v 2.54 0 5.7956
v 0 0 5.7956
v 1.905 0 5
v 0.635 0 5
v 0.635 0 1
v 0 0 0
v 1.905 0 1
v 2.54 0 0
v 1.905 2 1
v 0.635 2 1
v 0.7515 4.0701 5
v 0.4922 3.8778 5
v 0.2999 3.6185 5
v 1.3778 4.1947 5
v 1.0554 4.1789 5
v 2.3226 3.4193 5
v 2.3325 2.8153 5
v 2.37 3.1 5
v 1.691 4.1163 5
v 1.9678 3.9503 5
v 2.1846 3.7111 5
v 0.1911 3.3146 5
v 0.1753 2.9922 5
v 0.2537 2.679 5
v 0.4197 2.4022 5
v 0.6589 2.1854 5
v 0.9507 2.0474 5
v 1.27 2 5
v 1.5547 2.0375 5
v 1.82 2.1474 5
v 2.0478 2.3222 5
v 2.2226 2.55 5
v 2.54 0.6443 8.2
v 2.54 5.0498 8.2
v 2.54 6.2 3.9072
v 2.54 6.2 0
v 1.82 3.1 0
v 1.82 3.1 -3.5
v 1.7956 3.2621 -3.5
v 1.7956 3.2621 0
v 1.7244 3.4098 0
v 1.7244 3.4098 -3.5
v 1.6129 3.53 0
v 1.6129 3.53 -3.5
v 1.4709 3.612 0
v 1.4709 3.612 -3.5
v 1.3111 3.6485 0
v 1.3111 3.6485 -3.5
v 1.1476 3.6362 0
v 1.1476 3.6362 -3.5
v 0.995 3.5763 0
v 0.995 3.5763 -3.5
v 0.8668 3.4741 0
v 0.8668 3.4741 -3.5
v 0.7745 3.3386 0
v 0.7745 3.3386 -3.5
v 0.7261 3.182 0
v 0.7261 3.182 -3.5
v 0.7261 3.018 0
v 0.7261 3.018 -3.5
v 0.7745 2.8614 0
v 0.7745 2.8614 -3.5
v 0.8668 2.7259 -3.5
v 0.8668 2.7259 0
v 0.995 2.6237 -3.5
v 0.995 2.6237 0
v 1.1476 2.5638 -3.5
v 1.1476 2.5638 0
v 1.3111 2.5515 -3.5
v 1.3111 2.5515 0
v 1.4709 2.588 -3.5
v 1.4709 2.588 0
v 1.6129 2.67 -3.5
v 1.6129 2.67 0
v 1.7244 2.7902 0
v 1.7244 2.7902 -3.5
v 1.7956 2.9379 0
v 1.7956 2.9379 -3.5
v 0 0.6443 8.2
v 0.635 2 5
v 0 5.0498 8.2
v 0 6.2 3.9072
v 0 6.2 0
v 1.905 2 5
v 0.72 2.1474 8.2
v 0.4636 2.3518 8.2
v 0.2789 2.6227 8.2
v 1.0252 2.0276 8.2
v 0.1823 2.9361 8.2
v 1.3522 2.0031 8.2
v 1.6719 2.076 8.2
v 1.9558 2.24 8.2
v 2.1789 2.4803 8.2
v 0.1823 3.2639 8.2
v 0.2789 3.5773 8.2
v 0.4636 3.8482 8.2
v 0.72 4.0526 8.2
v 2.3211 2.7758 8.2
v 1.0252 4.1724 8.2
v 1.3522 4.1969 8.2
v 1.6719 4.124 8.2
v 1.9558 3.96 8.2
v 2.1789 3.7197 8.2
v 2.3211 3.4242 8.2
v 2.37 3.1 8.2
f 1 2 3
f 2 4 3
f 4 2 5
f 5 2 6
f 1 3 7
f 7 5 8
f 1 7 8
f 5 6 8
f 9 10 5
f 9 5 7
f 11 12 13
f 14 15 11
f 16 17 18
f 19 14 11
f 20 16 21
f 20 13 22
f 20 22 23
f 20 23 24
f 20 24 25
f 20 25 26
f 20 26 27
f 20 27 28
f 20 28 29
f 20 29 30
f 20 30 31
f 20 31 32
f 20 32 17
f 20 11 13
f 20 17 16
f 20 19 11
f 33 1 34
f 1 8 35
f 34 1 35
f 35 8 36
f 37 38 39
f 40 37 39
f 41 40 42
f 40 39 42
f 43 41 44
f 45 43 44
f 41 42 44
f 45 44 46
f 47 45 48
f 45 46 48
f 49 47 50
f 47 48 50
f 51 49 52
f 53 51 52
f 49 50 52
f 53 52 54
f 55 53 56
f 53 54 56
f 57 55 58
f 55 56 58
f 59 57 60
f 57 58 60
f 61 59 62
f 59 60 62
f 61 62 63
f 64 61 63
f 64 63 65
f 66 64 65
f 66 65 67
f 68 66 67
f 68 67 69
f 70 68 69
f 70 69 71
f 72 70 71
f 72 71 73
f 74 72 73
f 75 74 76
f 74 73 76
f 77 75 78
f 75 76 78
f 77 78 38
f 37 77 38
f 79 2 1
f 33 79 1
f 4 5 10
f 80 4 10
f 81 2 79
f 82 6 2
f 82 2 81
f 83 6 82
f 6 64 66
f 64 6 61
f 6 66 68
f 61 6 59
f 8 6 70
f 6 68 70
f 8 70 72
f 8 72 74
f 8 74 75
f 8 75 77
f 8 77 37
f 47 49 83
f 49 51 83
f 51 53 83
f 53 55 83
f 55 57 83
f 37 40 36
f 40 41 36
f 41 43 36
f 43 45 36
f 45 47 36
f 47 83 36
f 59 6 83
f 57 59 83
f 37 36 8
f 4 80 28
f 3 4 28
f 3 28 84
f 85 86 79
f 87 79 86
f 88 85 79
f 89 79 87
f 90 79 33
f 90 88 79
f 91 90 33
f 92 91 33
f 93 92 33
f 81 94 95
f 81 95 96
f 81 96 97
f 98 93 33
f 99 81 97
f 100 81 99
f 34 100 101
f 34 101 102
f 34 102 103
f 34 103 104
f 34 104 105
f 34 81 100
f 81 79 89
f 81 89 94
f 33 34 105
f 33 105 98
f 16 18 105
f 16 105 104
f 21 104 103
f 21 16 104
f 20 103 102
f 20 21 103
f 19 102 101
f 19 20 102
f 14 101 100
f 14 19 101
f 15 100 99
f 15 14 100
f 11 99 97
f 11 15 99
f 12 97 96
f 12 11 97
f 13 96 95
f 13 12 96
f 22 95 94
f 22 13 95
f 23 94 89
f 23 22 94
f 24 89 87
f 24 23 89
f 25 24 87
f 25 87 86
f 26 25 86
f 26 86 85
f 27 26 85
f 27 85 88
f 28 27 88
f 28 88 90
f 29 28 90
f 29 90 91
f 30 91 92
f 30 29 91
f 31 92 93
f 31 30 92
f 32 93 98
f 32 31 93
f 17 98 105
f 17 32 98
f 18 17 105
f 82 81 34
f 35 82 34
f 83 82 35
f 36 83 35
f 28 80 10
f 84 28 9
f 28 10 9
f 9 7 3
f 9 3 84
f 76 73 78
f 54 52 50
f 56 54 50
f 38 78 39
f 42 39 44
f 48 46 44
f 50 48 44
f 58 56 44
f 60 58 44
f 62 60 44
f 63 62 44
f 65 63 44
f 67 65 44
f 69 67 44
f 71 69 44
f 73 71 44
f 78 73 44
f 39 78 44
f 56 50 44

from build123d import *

# Parameters (mm, degrees)
CYLINDER001_R           = 0.55
CYLINDER001_DEPTH       = 3.5
CYLINDER_R              = 1.1
CYLINDER_DEPTH          = 3.5
CUBE003_W               = 4
CUBE003_H               = 6
CUBE003_DEPTH           = 9
CUBE003_PLACEMENT_ANGLE = 15
CUBE002_W               = 4
CUBE002_H               = 6
CUBE002_DEPTH           = 8
CUBE002_PLACEMENT_ANGLE = 15
CUBE001_W               = 1.27
CUBE001_H               = 3
CUBE001_DEPTH           = 4
CUBE_W                  = 2.54
CUBE_H                  = 6.2
CUBE_DEPTH              = 8.2


with BuildPart() as cylinder001:
    # cylinder001 → cylinder001 (new body)
    with BuildSketch(Plane(origin=(1.27, 3.1, -3.5), x_dir=(1, 0, 0), z_dir=(0, 0, 1))):
        Circle(CYLINDER001_R)
    extrude(amount=CYLINDER001_DEPTH)


with BuildPart() as cylinder:
    # cylinder → cylinder (new body)
    with BuildSketch(Plane(origin=(1.27, 3.1, 5), x_dir=(1, 0, 0), z_dir=(0, 0, 1))):
        Circle(CYLINDER_R)
    extrude(amount=CYLINDER_DEPTH)


with BuildPart() as cube003:
    # cube003 → cube003 (new body)
    with BuildSketch(Plane.XY):
        with Locations((2, 3)):
            Rectangle(CUBE003_W, CUBE003_H)
    extrude(amount=CUBE003_DEPTH)


with BuildPart() as cube003_1:
    # cube003 placement: moved
    add(cube003.part.moved(Location((-1, -7.244444, 1.941143))).rotate(Axis((-1, -7.244444, 1.941143), (-1, 0, 0)), CUBE003_PLACEMENT_ANGLE))


with BuildPart() as cube002:
    # cube002 → cube002 (new body)
    with BuildSketch(Plane.XY):
        with Locations((2, 3)):
            Rectangle(CUBE002_W, CUBE002_H)
    extrude(amount=CUBE002_DEPTH)


with BuildPart() as cube002_1:
    # cube002 placement: moved
    add(cube002.part.moved(Location((-1, 6.761481, 1.811733))).rotate(Axis((-1, 6.761481, 1.811733), (1, 0, 0)), CUBE002_PLACEMENT_ANGLE))


with BuildPart() as cube001:
    # cube001 → cube001 (new body)
    with BuildSketch(Plane(origin=(0.635, -1, 1), x_dir=(1, 0, 0), z_dir=(0, 0, 1))):
        with Locations((0.635, 1.5)):
            Rectangle(CUBE001_W, CUBE001_H)
    extrude(amount=CUBE001_DEPTH)


with BuildPart() as group:
    # cube → cube (new body)
    with BuildSketch(Plane.XY):
        with Locations((1.27, 3.1)):
            Rectangle(CUBE_W, CUBE_H)
    extrude(amount=CUBE_DEPTH)

    # difference: cut cube001
    add(cube001.part, mode=Mode.SUBTRACT)

    # difference001: cut cube002
    add(cube002_1.part, mode=Mode.SUBTRACT)

    # difference002: cut cube003
    add(cube003_1.part, mode=Mode.SUBTRACT)

    # difference003: cut cylinder
    add(cylinder.part, mode=Mode.SUBTRACT)

    # Group: union cylinder001
    add(cylinder001.part)


solid = group.part
